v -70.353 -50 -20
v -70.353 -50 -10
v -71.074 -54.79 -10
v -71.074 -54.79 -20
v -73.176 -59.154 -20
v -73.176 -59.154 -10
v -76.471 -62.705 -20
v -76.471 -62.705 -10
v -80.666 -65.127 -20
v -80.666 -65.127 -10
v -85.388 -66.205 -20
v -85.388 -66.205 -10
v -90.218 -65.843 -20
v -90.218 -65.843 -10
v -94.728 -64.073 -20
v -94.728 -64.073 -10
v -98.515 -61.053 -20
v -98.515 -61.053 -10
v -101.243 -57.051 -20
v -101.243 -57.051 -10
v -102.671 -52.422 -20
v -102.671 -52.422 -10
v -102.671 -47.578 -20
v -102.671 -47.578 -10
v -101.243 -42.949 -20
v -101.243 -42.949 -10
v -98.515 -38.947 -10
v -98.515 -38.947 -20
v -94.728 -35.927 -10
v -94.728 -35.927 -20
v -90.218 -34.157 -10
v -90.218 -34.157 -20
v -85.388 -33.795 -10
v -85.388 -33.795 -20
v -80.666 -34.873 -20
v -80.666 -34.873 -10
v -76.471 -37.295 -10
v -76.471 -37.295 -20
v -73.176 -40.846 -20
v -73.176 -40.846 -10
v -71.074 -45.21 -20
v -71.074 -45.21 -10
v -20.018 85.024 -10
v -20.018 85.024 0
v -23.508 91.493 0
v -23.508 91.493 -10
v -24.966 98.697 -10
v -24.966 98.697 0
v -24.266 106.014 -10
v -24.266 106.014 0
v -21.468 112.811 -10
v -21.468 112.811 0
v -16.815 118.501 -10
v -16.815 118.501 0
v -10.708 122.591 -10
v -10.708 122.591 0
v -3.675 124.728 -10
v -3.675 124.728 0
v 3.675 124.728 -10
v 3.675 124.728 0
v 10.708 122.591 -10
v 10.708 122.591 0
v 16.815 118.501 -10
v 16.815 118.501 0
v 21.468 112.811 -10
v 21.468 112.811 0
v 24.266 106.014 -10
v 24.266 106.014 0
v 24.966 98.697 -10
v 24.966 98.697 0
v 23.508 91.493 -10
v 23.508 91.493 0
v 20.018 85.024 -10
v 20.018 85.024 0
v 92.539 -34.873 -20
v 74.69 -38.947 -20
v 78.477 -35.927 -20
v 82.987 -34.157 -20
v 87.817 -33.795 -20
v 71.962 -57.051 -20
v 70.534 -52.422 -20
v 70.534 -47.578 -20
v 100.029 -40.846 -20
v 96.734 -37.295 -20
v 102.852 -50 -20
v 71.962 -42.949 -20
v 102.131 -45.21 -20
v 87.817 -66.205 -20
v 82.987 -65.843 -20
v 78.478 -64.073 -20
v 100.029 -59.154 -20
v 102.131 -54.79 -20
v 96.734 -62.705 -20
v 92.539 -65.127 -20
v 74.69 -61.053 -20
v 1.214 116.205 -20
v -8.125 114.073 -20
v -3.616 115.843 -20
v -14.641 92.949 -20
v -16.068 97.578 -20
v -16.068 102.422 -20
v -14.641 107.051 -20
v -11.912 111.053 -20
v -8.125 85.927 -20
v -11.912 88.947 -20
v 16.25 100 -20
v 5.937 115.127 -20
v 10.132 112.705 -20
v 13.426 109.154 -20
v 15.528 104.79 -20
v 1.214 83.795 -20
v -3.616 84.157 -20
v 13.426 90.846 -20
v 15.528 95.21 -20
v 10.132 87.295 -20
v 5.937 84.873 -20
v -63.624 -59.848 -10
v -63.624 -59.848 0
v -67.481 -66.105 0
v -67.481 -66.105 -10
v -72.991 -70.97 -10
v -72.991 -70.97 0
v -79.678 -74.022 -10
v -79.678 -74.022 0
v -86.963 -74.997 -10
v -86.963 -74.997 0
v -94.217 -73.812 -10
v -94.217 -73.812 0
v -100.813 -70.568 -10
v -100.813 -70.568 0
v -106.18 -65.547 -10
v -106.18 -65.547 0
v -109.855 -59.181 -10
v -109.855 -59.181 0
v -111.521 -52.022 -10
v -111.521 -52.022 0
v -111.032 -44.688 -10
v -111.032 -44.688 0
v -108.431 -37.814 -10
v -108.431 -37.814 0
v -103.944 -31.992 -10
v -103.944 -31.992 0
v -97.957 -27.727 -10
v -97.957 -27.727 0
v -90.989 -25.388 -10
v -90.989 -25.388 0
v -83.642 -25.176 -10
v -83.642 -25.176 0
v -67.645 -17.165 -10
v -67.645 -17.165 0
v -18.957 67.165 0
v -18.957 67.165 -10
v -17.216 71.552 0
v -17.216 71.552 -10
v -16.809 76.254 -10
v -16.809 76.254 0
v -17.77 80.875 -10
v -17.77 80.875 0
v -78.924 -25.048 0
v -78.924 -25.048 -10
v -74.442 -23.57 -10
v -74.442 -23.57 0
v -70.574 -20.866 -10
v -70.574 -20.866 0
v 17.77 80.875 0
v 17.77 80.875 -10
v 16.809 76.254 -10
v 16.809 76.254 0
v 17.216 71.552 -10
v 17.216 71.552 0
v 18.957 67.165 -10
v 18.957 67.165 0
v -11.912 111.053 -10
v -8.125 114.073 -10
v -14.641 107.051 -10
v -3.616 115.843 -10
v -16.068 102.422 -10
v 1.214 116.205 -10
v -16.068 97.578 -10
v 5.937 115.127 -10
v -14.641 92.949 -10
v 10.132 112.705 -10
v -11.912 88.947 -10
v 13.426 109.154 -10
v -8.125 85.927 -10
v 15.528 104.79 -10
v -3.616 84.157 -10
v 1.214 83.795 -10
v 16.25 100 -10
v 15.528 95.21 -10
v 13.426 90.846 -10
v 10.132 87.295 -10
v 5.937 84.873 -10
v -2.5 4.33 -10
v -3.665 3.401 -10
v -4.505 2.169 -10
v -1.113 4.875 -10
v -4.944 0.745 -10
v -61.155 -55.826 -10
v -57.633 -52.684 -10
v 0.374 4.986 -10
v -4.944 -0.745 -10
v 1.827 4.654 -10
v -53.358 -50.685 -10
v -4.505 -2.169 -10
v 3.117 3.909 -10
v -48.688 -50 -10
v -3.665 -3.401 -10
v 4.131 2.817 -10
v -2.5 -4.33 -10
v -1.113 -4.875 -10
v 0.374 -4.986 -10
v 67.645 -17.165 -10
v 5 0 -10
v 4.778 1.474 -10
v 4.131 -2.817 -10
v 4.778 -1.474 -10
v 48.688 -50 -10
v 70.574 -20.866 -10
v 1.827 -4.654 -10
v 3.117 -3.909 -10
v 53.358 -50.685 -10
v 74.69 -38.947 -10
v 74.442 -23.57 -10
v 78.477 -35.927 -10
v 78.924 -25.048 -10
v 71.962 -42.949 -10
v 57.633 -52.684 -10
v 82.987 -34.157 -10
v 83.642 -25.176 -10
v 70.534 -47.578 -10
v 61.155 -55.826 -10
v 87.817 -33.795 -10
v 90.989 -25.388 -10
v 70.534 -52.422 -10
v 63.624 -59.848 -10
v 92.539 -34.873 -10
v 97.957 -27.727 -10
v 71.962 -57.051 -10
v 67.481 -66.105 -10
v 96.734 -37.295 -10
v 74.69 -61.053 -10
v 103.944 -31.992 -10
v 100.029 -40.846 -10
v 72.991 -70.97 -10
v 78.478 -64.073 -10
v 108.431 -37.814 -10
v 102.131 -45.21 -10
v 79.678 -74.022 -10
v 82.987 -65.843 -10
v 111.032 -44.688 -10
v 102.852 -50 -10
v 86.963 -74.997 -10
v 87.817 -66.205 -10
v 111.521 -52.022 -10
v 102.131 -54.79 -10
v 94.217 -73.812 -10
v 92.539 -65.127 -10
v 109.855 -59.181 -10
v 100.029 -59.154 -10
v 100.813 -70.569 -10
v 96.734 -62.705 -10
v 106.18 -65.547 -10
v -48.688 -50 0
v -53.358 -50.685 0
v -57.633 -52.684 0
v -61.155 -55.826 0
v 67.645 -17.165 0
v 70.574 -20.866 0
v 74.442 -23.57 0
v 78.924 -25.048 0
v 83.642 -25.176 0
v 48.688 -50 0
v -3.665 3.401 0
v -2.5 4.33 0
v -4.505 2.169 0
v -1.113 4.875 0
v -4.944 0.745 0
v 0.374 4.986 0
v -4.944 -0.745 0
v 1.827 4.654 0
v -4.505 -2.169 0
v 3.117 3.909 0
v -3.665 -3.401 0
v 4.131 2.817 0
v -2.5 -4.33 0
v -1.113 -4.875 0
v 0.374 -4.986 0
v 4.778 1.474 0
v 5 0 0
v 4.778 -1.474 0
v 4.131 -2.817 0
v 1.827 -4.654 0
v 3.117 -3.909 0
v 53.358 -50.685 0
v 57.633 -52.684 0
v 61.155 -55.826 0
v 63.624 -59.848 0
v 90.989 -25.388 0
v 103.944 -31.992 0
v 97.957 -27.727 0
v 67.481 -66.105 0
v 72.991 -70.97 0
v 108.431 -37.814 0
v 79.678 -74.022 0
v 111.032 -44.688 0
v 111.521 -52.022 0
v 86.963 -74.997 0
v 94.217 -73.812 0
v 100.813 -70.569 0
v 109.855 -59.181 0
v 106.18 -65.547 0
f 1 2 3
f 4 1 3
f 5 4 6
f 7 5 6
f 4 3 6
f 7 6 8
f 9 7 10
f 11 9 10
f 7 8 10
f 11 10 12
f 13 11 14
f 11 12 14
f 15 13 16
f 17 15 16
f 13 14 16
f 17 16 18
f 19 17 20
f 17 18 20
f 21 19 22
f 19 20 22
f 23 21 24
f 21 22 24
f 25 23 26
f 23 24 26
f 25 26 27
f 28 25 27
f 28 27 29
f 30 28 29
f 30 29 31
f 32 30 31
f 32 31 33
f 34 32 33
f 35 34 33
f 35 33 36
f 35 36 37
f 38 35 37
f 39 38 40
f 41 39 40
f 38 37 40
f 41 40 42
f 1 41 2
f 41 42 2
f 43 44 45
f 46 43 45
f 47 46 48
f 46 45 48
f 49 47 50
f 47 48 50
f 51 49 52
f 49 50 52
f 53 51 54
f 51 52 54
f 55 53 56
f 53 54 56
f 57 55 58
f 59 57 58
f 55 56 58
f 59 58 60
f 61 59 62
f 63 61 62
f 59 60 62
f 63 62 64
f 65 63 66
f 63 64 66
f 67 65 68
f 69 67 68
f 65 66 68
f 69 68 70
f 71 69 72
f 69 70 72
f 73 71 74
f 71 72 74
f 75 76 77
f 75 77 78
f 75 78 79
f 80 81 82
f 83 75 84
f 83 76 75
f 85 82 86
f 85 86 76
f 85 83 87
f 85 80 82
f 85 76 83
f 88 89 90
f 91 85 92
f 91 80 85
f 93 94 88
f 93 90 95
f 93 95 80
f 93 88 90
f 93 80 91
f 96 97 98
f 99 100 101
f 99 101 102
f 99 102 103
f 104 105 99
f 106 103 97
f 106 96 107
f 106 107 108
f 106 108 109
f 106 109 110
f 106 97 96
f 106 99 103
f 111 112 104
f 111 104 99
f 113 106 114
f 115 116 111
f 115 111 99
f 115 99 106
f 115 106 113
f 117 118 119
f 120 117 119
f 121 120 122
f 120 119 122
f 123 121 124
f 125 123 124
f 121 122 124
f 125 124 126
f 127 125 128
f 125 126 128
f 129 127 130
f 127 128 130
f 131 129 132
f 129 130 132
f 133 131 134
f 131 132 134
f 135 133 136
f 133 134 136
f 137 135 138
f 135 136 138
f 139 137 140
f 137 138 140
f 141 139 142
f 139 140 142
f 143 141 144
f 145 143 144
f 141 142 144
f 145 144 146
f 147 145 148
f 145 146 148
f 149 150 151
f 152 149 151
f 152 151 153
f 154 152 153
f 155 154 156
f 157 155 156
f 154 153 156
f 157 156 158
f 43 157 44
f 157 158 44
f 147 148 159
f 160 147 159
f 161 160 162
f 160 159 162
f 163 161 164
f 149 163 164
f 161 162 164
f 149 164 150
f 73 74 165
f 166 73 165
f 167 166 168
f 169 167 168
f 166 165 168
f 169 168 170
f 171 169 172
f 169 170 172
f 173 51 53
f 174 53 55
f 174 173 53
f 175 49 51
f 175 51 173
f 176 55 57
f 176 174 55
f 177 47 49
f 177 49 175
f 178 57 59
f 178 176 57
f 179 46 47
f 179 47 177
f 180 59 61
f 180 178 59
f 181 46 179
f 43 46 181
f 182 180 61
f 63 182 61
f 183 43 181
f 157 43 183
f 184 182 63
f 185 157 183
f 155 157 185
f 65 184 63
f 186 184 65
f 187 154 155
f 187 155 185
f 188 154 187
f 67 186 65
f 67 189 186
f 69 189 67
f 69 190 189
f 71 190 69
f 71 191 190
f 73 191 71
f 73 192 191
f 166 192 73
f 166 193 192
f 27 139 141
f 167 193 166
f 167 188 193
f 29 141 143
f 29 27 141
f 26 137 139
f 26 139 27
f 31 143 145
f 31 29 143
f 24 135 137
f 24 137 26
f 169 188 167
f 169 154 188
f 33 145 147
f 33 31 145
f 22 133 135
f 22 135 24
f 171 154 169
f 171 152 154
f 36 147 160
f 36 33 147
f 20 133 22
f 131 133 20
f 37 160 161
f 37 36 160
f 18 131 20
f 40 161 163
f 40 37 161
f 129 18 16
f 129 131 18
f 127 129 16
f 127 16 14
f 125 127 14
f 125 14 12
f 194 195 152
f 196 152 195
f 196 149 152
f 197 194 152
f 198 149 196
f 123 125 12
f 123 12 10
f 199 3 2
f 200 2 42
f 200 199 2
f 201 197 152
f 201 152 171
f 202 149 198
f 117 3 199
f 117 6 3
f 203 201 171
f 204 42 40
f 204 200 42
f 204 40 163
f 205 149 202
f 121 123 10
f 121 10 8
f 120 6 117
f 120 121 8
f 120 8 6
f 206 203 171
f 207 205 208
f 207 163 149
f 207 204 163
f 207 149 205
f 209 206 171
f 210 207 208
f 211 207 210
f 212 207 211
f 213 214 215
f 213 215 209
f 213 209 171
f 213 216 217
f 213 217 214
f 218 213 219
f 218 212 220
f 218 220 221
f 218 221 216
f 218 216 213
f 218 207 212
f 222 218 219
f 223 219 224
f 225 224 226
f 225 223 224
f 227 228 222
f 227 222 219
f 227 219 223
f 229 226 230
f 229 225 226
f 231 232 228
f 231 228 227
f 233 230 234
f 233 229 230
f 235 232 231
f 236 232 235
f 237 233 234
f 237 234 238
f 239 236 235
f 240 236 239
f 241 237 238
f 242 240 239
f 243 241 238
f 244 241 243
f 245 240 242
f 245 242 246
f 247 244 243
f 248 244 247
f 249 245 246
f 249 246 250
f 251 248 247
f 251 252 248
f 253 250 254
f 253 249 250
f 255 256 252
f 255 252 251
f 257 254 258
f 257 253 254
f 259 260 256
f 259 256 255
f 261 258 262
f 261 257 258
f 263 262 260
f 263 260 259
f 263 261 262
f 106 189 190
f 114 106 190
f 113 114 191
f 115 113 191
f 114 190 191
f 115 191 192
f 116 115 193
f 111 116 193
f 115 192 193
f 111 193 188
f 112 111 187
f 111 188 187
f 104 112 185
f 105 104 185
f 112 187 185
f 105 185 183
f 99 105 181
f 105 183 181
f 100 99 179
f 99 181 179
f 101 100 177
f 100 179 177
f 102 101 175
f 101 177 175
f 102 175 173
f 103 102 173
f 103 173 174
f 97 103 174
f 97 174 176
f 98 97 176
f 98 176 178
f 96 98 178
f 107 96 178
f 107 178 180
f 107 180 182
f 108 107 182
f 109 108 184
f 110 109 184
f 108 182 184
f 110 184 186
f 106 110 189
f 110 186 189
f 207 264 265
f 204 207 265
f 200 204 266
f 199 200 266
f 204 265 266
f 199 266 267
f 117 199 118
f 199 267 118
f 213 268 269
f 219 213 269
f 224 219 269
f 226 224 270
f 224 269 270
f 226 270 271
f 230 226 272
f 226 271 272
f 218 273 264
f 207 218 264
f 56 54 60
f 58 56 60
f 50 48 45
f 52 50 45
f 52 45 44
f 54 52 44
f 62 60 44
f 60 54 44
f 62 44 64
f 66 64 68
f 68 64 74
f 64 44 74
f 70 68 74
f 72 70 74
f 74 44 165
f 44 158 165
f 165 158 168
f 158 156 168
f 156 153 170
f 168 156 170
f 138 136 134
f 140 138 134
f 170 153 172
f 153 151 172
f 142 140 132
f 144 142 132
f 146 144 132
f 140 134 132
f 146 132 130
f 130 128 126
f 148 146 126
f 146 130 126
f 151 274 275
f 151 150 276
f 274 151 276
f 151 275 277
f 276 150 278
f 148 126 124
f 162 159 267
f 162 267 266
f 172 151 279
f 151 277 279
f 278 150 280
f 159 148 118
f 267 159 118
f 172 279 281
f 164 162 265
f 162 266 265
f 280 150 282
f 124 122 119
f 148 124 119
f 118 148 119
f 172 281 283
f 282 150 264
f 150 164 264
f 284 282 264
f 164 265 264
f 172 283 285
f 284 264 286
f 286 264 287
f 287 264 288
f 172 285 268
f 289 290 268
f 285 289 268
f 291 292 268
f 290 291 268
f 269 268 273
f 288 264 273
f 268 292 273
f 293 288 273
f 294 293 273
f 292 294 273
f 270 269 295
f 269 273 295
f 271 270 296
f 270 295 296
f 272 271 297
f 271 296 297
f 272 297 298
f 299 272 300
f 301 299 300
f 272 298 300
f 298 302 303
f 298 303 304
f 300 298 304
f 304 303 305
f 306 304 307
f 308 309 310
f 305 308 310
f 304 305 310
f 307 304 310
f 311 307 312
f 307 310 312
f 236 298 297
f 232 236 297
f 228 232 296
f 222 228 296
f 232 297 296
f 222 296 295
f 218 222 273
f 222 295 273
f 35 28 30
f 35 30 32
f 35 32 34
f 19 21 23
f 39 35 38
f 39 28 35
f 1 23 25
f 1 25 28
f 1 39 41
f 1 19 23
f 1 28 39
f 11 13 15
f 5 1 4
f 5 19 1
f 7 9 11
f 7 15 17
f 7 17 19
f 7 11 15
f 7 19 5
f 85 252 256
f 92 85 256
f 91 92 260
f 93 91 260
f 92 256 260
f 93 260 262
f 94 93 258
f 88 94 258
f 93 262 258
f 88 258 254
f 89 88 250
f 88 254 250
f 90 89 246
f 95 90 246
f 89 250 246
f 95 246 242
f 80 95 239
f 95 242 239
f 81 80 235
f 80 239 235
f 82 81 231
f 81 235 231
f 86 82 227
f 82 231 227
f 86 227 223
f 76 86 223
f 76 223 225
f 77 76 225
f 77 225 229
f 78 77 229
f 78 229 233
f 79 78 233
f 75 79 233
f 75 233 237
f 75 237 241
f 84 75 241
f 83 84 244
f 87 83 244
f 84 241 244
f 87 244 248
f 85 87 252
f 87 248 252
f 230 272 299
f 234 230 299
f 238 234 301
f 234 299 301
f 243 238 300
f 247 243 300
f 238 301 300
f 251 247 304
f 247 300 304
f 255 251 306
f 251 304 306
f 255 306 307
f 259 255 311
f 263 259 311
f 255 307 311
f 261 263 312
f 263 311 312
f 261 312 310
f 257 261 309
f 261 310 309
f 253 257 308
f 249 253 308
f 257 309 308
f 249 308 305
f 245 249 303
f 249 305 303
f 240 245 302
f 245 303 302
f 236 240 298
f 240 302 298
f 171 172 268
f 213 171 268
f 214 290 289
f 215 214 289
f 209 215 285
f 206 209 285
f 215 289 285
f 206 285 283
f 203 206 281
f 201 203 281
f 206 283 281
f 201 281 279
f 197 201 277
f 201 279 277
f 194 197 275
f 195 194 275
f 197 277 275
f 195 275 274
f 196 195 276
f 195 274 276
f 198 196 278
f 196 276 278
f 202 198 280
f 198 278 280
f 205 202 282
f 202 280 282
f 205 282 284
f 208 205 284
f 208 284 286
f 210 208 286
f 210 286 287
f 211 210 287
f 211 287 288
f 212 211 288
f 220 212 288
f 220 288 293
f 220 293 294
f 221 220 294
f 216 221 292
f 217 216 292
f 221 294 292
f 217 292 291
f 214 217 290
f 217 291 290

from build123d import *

# Parameters (mm, degrees)
BOSS_EXTRUDE1_DEPTH = 10
SKETCH2_R           = 16.25
BOSS_EXTRUDE2_DEPTH = 10
SKETCH3_R           = 5
CUT_EXTRUDE1_DEPTH  = 10


with BuildPart() as part:
    # Sketch1 → Boss-Extrude1 (new body)
    with BuildSketch(Plane(origin=(0, 0, 0), x_dir=(1, 0, 0), z_dir=(0, 0, -1))):
        with BuildLine():
            Line((18.95720217, -67.165147363), (67.645318019, 17.165182331))
            ThreePointArc((67.645318019, 17.165182331), (74.442164244, 23.570200009), (83.642337861, 25.175869802))
            ThreePointArc((83.642337861, 25.175869802), (108.253132571, 62.500004371), (63.624087575, 59.848480209))
            ThreePointArc((63.624087575, 59.848480209), (57.63345283, 52.683728615), (48.68812278, 49.999992345))
            Line((48.68812278, 49.999992345), (-48.688142969, 49.999972686))
            ThreePointArc((-48.688142969, 49.999972686), (-57.633474102, 52.683705343), (-63.624111741, 59.848454519))
            ThreePointArc((-63.624111741, 59.848454519), (-108.253157807, 62.49996066), (-83.642348027, 25.175836028))
            ThreePointArc((-83.642348027, 25.175836028), (-74.442173761, 23.570169951), (-67.64532495, 17.165155017))
            Line((-67.64532495, 17.165155017), (-18.95717505, -67.165155017))
            ThreePointArc((-18.95717505, -67.165155017), (-16.808690142, -76.253905353), (-20.01822612, -85.02432432))
            ThreePointArc((-20.01822612, -85.02432432), (2.5237e-05, -124.999965031), (20.018260452, -85.024316237))
            ThreePointArc((20.018260452, -85.024316237), (16.808720932, -76.253898566), (18.95720217, -67.165147363))
        make_face()
    extrude(amount=BOSS_EXTRUDE1_DEPTH)

    # Sketch2 → Boss-Extrude2 (add)
    with BuildSketch(Plane(origin=(0, 0, -10), x_dir=(1, 0, 0), z_dir=(0, 0, -1))):
        with Locations((86.6025, 50)):
            Circle(SKETCH2_R)
        with Locations((2.0189e-05, -99.999965031)):
            Circle(SKETCH2_R)
        with Locations((-86.602520189, 49.999965031)):
            Circle(SKETCH2_R)
    extrude(amount=BOSS_EXTRUDE2_DEPTH)

    # Sketch3 → Cut-Extrude1 (cut)
    with BuildSketch(Plane.XY):
        Circle(SKETCH3_R)
    extrude(amount=-CUT_EXTRUDE1_DEPTH, mode=Mode.SUBTRACT)


solid = part.part
